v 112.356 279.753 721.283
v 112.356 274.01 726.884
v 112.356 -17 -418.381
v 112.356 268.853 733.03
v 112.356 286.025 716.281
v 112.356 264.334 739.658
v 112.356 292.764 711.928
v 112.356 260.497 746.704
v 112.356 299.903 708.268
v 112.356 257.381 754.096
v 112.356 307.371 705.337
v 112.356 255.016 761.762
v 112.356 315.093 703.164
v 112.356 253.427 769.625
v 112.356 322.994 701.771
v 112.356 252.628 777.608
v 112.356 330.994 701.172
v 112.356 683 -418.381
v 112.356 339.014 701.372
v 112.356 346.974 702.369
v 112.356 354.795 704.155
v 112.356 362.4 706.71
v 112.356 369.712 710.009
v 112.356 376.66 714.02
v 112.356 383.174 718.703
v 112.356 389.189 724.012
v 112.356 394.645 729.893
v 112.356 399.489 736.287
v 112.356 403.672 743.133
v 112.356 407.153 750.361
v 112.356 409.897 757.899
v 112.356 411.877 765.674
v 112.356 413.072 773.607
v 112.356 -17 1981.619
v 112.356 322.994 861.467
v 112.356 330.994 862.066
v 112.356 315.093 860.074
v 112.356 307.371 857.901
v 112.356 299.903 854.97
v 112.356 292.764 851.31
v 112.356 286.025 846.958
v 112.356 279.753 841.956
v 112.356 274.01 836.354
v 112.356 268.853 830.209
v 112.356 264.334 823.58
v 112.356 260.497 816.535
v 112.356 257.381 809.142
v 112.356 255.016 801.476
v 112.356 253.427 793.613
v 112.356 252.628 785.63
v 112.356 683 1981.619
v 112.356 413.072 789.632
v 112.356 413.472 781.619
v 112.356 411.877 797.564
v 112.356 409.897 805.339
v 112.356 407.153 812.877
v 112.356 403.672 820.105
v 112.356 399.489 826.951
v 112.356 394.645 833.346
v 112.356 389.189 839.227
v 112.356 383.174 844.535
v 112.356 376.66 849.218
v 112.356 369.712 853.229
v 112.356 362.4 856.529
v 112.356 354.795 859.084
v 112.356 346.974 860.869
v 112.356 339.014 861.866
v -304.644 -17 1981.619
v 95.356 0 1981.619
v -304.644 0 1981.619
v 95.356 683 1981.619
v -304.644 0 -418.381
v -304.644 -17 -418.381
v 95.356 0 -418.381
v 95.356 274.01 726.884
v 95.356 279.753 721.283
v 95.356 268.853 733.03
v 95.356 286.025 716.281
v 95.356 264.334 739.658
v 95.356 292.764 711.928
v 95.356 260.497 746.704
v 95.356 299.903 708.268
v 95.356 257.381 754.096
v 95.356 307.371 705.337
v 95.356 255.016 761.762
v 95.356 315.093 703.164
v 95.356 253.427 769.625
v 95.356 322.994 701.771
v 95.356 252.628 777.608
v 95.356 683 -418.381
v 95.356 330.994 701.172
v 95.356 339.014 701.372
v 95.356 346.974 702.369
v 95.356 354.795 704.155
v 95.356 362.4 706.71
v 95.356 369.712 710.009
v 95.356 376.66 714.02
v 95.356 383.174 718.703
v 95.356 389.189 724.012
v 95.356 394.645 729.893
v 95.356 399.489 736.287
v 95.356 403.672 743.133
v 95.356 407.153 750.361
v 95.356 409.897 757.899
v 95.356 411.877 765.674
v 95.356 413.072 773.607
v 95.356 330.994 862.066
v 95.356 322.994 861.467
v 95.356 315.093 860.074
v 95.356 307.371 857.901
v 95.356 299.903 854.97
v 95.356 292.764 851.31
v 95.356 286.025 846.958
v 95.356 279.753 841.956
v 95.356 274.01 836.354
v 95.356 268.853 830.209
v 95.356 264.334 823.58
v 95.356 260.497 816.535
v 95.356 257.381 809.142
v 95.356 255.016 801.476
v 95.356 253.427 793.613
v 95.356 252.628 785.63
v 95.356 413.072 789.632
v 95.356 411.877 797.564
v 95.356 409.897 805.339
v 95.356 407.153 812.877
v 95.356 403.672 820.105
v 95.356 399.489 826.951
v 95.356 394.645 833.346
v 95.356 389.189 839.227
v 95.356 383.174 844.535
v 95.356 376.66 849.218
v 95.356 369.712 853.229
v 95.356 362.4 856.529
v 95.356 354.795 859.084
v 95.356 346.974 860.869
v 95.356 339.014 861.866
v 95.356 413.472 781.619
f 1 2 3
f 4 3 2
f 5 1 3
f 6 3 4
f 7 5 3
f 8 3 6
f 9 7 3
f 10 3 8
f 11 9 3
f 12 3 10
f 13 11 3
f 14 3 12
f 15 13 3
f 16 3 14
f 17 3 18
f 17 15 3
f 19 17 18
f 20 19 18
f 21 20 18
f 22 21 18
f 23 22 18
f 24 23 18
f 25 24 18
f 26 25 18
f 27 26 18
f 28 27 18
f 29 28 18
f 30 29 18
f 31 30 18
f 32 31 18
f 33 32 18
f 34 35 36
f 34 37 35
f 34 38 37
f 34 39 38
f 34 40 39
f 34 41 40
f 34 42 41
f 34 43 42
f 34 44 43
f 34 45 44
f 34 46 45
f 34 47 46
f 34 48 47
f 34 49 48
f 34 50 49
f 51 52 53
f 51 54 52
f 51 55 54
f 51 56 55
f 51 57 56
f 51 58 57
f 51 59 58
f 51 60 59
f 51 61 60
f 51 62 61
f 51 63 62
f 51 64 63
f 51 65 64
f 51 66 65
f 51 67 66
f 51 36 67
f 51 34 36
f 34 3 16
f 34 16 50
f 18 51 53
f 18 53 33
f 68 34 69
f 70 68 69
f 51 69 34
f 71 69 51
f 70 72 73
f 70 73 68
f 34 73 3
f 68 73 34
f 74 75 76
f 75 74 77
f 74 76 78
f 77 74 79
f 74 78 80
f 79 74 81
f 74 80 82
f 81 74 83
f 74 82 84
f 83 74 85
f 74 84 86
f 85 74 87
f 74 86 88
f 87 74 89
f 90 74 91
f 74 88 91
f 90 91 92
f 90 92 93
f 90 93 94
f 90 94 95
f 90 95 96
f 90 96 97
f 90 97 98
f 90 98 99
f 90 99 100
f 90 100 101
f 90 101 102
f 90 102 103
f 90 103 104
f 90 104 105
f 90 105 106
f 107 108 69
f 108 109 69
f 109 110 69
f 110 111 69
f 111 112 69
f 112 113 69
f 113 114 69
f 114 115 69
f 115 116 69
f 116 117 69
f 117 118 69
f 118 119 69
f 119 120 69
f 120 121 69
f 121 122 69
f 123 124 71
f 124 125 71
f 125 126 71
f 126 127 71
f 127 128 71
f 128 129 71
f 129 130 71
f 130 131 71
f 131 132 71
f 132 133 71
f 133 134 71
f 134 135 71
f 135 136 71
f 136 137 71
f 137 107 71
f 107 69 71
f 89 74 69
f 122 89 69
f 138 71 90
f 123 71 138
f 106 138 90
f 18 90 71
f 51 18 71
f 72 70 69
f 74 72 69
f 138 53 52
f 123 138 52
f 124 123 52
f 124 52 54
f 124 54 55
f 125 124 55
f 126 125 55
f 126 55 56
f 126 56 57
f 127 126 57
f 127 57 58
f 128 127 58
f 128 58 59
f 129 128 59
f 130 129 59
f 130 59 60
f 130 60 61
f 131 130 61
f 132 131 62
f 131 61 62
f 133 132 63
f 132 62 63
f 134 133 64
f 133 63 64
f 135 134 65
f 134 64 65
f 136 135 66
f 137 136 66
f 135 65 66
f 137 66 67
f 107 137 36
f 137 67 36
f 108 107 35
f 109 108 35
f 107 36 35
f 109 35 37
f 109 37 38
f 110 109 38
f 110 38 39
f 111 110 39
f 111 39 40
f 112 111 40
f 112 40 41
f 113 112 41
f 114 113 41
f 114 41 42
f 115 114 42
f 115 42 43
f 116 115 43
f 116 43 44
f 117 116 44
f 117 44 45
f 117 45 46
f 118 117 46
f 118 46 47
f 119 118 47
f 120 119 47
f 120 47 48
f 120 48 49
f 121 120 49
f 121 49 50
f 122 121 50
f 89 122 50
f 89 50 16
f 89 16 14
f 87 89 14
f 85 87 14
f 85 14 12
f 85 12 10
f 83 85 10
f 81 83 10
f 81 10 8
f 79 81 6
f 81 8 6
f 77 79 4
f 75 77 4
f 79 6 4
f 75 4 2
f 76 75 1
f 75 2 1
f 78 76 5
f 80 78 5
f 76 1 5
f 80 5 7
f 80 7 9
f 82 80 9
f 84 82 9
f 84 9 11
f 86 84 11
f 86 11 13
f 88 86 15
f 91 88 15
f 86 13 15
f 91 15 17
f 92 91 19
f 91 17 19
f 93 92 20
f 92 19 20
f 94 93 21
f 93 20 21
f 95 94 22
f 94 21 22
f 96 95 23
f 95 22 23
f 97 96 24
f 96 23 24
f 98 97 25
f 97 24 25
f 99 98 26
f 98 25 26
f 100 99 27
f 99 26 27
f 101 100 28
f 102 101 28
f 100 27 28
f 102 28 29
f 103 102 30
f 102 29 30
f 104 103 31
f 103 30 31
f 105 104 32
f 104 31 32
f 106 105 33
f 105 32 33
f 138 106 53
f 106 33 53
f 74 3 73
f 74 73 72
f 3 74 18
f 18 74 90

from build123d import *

# Parameters (mm, degrees)
F0_W     = 400
F0_H     = 2400
F1_DEPTH = 17
F2_W     = 700
F2_H     = 2400
F3_DEPTH = 17
F4_R     = 80.472245
F5_DEPTH = 25


with BuildPart() as f1:
    # F0 (on Front) → F1 (new body)
    with BuildSketch(Plane.XZ):
        with Locations((-104.643844, 781.619109)):
            Rectangle(F0_W, F0_H)
    extrude(amount=F1_DEPTH)

    # F2 (on face) → F3 (join)
    with BuildSketch(Plane.YZ.offset(95.356156)):
        with Locations((333, 781.619109)):
            Rectangle(F2_W, F2_H)
    extrude(amount=F3_DEPTH)

    # F4 (on face) → F5 (cut)
    with BuildSketch(Plane.YZ.offset(112.356156)):
        with Locations((333, 781.619109)):
            Circle(F4_R)
    extrude(amount=-F5_DEPTH, mode=Mode.SUBTRACT)


solid = f1.part
